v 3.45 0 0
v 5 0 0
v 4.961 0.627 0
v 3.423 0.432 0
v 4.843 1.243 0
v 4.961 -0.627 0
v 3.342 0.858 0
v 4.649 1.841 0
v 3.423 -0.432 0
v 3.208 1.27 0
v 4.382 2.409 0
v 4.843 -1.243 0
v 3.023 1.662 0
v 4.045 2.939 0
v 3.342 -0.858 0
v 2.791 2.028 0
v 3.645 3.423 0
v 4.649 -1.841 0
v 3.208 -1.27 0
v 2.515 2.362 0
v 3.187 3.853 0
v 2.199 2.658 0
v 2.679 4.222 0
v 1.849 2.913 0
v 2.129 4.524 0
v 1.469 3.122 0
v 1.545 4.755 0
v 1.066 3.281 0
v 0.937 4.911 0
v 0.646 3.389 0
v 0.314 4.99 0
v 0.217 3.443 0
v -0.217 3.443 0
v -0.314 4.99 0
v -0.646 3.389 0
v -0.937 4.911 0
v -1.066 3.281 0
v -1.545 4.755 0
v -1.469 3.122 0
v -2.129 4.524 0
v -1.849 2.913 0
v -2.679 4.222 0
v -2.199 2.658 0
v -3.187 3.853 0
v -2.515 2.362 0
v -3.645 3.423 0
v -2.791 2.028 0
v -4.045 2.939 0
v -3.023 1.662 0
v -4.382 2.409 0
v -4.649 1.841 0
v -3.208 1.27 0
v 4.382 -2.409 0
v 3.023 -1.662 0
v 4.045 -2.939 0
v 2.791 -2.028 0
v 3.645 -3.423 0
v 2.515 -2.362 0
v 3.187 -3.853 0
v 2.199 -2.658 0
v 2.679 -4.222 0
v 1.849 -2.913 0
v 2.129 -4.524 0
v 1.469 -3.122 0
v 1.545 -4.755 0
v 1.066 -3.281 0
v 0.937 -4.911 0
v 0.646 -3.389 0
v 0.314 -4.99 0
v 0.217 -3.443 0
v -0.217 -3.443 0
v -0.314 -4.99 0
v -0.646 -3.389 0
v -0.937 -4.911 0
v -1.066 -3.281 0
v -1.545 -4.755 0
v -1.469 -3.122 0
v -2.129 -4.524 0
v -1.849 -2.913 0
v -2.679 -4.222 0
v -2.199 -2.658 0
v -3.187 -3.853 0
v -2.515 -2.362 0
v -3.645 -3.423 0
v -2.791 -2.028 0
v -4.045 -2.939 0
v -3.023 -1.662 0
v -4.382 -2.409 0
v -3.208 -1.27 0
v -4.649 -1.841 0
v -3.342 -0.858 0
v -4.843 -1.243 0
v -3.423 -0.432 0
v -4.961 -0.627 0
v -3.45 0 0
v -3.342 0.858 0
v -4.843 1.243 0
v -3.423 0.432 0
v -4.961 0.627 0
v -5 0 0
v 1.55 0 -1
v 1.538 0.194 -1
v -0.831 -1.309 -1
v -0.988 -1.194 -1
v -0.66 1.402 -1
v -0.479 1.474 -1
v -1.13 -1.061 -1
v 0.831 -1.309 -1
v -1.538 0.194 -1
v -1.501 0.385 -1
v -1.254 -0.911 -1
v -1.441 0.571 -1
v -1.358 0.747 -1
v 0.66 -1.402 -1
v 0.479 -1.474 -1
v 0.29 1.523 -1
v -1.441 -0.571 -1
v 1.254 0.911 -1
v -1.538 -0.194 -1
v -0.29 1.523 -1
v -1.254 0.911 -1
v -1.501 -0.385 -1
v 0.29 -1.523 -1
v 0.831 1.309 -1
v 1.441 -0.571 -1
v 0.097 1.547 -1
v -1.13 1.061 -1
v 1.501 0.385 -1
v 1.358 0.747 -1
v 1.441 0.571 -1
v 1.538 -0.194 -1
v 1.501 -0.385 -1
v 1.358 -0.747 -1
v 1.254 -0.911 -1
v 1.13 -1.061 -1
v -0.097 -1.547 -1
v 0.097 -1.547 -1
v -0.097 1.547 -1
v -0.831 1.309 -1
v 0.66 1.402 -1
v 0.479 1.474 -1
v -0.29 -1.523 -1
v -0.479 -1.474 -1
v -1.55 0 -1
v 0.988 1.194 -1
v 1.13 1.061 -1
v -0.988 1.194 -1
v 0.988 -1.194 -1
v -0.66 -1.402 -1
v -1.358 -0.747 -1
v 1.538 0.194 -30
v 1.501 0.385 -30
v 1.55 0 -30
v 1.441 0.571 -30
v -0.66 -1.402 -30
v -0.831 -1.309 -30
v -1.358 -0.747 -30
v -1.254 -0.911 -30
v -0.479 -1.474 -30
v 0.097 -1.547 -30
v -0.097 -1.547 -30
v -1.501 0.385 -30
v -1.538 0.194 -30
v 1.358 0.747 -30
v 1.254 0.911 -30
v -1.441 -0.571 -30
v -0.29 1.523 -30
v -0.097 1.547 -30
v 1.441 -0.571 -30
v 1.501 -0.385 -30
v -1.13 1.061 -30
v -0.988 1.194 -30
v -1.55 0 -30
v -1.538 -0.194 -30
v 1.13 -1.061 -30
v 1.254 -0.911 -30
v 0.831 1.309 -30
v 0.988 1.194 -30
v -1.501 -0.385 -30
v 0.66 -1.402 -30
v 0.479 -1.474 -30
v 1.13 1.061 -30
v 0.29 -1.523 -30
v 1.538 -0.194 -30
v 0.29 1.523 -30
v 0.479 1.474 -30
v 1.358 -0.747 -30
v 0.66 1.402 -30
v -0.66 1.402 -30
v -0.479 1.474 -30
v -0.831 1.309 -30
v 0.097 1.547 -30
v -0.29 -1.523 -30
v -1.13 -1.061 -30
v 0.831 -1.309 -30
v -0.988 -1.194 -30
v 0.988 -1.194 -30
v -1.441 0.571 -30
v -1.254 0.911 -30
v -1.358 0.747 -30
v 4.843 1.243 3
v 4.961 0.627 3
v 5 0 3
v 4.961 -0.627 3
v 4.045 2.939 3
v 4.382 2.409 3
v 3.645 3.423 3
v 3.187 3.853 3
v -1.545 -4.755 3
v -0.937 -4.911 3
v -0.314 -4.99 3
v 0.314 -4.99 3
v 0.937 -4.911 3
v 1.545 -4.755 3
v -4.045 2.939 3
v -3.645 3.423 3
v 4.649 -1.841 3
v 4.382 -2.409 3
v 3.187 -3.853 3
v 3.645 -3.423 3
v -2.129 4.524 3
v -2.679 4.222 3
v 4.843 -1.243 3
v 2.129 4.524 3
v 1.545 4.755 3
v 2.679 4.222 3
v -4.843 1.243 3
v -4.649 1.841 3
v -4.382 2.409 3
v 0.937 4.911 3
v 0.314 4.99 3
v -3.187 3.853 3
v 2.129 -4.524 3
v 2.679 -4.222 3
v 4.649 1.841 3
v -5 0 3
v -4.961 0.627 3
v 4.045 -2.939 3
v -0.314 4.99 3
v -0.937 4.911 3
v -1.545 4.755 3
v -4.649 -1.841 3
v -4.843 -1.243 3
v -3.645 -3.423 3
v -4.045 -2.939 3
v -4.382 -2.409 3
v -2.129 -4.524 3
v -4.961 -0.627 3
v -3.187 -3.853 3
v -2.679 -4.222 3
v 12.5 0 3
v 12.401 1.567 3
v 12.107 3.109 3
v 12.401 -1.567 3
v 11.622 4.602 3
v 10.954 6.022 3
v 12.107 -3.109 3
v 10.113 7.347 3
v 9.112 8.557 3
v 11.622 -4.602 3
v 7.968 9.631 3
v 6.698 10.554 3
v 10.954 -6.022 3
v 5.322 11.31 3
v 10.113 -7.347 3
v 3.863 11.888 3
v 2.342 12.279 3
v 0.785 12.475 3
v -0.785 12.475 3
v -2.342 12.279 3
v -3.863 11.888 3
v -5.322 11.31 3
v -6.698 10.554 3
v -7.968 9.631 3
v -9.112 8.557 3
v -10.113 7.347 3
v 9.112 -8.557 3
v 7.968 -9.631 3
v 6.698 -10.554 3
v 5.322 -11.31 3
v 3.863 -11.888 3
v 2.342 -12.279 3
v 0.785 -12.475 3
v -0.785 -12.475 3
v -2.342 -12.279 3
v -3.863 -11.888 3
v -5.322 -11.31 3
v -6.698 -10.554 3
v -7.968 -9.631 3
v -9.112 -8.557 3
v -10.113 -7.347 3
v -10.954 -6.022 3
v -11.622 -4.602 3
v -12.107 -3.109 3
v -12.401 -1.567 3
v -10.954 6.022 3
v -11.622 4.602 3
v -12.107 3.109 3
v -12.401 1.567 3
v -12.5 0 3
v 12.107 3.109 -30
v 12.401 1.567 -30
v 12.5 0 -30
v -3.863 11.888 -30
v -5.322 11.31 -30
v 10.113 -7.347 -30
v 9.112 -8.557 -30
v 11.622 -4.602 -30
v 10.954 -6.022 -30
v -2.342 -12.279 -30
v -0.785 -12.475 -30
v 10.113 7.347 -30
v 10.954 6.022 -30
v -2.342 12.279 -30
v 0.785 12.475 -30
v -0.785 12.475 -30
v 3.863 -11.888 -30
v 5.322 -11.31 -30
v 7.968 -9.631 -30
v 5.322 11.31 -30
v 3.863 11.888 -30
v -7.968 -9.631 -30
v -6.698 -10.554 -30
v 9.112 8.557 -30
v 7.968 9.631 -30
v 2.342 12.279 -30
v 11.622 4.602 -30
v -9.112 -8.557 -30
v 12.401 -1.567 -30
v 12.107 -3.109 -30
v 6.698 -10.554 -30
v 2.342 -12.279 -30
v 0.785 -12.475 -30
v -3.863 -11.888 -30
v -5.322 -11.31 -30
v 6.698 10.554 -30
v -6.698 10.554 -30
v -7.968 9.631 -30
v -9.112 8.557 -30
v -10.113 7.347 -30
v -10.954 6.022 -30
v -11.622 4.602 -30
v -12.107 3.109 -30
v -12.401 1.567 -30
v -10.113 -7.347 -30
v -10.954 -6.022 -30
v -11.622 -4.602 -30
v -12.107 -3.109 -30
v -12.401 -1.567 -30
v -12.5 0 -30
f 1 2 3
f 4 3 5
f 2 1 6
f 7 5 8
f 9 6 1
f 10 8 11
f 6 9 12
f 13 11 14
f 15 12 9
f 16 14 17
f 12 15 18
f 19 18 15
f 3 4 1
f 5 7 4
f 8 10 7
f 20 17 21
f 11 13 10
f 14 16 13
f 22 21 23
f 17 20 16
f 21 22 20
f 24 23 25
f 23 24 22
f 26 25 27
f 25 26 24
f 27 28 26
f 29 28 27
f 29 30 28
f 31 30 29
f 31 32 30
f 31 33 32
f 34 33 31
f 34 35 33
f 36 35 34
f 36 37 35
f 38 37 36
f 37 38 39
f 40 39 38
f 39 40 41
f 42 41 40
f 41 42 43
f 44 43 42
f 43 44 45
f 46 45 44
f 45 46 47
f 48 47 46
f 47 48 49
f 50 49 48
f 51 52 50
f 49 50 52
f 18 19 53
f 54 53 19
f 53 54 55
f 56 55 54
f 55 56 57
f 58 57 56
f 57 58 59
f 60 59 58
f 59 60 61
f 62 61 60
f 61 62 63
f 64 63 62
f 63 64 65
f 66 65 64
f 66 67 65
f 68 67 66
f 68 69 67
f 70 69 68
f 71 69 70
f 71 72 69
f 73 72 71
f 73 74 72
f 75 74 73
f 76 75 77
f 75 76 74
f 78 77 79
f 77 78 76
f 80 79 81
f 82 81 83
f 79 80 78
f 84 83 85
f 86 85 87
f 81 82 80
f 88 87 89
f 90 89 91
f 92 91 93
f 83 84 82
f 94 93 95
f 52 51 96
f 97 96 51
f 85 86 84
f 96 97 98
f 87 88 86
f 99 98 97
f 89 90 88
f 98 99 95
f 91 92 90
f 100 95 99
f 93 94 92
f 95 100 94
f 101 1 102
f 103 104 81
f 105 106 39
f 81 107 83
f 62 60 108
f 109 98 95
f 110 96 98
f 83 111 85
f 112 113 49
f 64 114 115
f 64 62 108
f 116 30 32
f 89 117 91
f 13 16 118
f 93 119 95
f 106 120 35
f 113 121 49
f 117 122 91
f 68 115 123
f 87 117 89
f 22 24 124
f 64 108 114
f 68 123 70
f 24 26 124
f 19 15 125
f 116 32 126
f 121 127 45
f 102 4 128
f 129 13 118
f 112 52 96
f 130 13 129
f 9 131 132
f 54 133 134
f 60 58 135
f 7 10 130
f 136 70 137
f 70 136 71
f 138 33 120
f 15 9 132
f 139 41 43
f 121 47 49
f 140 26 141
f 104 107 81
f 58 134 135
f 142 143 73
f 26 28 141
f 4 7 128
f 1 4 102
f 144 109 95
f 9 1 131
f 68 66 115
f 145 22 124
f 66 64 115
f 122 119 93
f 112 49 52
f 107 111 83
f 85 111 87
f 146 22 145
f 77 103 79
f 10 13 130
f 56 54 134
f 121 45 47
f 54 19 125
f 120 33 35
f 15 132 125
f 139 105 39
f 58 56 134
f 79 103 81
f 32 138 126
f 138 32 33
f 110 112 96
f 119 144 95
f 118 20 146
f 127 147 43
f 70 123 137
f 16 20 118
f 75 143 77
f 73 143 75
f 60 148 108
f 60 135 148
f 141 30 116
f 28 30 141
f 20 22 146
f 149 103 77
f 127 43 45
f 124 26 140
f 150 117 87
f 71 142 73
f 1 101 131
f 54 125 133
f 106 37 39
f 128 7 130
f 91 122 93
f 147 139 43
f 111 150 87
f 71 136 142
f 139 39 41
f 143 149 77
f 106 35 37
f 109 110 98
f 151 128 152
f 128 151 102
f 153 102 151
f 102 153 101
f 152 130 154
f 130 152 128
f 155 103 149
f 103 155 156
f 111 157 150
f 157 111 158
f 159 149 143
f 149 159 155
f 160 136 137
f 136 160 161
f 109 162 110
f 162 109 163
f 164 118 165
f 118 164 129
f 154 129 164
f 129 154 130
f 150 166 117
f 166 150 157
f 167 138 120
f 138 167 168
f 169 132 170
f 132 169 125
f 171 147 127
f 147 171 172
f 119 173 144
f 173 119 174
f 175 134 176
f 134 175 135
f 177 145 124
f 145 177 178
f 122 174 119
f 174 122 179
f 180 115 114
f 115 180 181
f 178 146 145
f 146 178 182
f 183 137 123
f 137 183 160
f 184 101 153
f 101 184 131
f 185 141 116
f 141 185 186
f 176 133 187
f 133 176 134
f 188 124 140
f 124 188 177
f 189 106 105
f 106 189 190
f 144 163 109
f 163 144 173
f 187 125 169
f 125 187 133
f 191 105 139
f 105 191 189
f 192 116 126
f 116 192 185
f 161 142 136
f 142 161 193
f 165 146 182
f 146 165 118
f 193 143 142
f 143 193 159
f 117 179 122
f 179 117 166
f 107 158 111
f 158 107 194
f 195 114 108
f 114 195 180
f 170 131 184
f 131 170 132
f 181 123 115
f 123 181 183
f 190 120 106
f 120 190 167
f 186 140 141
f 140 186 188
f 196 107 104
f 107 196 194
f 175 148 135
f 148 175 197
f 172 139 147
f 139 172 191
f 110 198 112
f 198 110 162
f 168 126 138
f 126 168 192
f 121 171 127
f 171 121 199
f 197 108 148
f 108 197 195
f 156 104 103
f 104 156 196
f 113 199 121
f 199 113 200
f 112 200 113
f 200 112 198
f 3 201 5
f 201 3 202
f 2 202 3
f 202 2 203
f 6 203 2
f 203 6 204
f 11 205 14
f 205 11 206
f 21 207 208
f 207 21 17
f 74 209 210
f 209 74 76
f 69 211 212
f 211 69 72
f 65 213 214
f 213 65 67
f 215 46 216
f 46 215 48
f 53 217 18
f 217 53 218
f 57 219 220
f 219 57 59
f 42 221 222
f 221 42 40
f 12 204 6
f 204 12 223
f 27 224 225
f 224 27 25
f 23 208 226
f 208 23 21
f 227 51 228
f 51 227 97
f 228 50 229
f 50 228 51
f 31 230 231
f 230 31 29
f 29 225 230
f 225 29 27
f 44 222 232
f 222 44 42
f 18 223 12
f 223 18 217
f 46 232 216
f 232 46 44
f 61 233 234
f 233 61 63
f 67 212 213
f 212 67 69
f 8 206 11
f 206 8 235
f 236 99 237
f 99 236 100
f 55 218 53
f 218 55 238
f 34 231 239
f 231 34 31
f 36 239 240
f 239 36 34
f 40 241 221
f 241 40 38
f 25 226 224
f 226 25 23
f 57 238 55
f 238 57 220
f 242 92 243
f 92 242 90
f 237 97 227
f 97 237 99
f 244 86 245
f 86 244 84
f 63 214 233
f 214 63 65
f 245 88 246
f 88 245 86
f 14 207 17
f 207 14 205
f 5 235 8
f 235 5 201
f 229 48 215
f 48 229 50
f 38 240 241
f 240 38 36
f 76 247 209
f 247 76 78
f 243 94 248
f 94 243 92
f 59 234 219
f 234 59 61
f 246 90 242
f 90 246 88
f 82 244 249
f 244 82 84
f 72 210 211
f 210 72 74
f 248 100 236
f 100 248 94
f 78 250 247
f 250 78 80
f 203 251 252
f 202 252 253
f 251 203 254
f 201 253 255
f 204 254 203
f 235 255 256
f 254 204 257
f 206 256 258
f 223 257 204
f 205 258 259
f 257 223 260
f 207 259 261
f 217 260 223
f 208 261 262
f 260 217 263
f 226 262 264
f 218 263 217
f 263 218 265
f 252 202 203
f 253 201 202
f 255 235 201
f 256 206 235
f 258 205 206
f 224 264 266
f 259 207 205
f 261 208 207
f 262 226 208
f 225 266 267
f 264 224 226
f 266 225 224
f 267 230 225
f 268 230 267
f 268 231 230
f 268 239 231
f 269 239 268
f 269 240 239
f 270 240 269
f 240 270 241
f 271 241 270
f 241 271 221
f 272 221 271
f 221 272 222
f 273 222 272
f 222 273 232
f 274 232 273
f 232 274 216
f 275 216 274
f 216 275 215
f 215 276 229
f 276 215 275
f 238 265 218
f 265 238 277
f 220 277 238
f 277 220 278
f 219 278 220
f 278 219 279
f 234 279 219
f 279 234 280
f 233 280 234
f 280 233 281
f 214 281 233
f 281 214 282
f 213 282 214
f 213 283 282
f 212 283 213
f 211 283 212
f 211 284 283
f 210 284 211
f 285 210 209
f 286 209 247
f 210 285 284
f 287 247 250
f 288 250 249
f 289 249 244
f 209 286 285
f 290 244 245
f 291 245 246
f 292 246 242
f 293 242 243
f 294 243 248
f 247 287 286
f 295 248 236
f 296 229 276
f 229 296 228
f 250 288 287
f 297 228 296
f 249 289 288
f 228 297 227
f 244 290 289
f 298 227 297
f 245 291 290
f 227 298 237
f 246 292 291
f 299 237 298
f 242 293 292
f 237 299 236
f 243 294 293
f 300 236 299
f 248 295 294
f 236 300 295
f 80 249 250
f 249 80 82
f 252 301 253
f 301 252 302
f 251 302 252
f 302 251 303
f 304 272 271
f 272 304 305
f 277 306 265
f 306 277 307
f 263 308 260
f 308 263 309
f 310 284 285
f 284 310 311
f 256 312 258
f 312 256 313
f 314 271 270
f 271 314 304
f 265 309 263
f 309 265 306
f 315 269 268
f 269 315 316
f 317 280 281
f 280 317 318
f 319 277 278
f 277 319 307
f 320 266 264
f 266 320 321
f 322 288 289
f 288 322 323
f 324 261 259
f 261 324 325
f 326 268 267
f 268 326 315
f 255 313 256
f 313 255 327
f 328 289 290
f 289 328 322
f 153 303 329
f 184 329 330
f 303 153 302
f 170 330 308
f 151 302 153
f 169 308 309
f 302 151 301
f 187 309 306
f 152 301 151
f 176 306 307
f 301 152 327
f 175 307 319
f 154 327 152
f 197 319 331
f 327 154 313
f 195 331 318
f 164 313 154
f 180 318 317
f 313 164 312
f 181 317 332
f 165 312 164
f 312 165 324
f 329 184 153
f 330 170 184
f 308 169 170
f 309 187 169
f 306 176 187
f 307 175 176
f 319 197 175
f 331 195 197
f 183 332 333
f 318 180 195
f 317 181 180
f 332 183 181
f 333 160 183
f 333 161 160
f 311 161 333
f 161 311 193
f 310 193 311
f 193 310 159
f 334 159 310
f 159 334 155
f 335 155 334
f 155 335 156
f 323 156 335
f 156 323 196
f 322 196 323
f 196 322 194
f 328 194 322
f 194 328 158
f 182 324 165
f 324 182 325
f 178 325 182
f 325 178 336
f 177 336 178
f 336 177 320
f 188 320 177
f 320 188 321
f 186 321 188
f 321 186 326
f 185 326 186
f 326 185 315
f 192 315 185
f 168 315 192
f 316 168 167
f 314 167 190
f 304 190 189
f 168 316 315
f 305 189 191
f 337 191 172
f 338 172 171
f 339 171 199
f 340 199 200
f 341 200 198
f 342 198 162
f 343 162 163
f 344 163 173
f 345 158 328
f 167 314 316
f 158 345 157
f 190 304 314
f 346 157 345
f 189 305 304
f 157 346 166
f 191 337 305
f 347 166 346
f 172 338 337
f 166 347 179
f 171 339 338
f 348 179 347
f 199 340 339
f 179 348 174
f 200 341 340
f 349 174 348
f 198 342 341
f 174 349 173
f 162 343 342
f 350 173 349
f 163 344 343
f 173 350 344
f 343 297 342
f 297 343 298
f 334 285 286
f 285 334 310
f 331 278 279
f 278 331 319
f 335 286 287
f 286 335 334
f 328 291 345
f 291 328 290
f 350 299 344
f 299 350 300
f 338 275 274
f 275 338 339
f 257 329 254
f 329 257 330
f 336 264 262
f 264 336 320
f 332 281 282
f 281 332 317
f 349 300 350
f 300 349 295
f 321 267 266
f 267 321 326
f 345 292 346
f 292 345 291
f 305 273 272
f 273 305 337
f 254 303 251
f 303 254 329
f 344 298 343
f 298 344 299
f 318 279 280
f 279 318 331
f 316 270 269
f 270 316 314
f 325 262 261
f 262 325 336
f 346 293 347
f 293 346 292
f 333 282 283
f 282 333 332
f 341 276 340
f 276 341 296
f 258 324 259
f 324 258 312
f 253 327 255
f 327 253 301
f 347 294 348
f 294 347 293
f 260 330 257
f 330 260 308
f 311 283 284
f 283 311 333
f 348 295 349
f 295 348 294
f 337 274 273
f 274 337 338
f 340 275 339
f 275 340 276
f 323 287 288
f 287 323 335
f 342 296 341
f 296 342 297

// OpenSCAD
$fn = 50;


difference() {
	union() {
		translate(v = [0, 0, -30.0000000000]) {
			cylinder(h = 33, r = 12.5000000000);
		}
	}
	union() {
		translate(v = [0, 0, 0]) {
			rotate(a = [0, 0, 0]) {
				difference() {
					union() {
						translate(v = [0, 0, -33.0000000000]) {
							cylinder(h = 33, r = 1.2500000000);
						}
						translate(v = [0, 0, -1.0000000000]) {
							cylinder(h = 1.0000000000, r1 = 1.5500000000, r2 = 3.4500000000);
						}
						translate(v = [0, 0, -33.0000000000]) {
							cylinder(h = 33, r = 1.5500000000);
						}
						translate(v = [0, 0, -33.0000000000]) {
							cylinder(h = 33, r = 1.2500000000);
						}
					}
					union();
				}
			}
		}
		#cylinder(h = 3, r = 5.0000000000);
	}
}
